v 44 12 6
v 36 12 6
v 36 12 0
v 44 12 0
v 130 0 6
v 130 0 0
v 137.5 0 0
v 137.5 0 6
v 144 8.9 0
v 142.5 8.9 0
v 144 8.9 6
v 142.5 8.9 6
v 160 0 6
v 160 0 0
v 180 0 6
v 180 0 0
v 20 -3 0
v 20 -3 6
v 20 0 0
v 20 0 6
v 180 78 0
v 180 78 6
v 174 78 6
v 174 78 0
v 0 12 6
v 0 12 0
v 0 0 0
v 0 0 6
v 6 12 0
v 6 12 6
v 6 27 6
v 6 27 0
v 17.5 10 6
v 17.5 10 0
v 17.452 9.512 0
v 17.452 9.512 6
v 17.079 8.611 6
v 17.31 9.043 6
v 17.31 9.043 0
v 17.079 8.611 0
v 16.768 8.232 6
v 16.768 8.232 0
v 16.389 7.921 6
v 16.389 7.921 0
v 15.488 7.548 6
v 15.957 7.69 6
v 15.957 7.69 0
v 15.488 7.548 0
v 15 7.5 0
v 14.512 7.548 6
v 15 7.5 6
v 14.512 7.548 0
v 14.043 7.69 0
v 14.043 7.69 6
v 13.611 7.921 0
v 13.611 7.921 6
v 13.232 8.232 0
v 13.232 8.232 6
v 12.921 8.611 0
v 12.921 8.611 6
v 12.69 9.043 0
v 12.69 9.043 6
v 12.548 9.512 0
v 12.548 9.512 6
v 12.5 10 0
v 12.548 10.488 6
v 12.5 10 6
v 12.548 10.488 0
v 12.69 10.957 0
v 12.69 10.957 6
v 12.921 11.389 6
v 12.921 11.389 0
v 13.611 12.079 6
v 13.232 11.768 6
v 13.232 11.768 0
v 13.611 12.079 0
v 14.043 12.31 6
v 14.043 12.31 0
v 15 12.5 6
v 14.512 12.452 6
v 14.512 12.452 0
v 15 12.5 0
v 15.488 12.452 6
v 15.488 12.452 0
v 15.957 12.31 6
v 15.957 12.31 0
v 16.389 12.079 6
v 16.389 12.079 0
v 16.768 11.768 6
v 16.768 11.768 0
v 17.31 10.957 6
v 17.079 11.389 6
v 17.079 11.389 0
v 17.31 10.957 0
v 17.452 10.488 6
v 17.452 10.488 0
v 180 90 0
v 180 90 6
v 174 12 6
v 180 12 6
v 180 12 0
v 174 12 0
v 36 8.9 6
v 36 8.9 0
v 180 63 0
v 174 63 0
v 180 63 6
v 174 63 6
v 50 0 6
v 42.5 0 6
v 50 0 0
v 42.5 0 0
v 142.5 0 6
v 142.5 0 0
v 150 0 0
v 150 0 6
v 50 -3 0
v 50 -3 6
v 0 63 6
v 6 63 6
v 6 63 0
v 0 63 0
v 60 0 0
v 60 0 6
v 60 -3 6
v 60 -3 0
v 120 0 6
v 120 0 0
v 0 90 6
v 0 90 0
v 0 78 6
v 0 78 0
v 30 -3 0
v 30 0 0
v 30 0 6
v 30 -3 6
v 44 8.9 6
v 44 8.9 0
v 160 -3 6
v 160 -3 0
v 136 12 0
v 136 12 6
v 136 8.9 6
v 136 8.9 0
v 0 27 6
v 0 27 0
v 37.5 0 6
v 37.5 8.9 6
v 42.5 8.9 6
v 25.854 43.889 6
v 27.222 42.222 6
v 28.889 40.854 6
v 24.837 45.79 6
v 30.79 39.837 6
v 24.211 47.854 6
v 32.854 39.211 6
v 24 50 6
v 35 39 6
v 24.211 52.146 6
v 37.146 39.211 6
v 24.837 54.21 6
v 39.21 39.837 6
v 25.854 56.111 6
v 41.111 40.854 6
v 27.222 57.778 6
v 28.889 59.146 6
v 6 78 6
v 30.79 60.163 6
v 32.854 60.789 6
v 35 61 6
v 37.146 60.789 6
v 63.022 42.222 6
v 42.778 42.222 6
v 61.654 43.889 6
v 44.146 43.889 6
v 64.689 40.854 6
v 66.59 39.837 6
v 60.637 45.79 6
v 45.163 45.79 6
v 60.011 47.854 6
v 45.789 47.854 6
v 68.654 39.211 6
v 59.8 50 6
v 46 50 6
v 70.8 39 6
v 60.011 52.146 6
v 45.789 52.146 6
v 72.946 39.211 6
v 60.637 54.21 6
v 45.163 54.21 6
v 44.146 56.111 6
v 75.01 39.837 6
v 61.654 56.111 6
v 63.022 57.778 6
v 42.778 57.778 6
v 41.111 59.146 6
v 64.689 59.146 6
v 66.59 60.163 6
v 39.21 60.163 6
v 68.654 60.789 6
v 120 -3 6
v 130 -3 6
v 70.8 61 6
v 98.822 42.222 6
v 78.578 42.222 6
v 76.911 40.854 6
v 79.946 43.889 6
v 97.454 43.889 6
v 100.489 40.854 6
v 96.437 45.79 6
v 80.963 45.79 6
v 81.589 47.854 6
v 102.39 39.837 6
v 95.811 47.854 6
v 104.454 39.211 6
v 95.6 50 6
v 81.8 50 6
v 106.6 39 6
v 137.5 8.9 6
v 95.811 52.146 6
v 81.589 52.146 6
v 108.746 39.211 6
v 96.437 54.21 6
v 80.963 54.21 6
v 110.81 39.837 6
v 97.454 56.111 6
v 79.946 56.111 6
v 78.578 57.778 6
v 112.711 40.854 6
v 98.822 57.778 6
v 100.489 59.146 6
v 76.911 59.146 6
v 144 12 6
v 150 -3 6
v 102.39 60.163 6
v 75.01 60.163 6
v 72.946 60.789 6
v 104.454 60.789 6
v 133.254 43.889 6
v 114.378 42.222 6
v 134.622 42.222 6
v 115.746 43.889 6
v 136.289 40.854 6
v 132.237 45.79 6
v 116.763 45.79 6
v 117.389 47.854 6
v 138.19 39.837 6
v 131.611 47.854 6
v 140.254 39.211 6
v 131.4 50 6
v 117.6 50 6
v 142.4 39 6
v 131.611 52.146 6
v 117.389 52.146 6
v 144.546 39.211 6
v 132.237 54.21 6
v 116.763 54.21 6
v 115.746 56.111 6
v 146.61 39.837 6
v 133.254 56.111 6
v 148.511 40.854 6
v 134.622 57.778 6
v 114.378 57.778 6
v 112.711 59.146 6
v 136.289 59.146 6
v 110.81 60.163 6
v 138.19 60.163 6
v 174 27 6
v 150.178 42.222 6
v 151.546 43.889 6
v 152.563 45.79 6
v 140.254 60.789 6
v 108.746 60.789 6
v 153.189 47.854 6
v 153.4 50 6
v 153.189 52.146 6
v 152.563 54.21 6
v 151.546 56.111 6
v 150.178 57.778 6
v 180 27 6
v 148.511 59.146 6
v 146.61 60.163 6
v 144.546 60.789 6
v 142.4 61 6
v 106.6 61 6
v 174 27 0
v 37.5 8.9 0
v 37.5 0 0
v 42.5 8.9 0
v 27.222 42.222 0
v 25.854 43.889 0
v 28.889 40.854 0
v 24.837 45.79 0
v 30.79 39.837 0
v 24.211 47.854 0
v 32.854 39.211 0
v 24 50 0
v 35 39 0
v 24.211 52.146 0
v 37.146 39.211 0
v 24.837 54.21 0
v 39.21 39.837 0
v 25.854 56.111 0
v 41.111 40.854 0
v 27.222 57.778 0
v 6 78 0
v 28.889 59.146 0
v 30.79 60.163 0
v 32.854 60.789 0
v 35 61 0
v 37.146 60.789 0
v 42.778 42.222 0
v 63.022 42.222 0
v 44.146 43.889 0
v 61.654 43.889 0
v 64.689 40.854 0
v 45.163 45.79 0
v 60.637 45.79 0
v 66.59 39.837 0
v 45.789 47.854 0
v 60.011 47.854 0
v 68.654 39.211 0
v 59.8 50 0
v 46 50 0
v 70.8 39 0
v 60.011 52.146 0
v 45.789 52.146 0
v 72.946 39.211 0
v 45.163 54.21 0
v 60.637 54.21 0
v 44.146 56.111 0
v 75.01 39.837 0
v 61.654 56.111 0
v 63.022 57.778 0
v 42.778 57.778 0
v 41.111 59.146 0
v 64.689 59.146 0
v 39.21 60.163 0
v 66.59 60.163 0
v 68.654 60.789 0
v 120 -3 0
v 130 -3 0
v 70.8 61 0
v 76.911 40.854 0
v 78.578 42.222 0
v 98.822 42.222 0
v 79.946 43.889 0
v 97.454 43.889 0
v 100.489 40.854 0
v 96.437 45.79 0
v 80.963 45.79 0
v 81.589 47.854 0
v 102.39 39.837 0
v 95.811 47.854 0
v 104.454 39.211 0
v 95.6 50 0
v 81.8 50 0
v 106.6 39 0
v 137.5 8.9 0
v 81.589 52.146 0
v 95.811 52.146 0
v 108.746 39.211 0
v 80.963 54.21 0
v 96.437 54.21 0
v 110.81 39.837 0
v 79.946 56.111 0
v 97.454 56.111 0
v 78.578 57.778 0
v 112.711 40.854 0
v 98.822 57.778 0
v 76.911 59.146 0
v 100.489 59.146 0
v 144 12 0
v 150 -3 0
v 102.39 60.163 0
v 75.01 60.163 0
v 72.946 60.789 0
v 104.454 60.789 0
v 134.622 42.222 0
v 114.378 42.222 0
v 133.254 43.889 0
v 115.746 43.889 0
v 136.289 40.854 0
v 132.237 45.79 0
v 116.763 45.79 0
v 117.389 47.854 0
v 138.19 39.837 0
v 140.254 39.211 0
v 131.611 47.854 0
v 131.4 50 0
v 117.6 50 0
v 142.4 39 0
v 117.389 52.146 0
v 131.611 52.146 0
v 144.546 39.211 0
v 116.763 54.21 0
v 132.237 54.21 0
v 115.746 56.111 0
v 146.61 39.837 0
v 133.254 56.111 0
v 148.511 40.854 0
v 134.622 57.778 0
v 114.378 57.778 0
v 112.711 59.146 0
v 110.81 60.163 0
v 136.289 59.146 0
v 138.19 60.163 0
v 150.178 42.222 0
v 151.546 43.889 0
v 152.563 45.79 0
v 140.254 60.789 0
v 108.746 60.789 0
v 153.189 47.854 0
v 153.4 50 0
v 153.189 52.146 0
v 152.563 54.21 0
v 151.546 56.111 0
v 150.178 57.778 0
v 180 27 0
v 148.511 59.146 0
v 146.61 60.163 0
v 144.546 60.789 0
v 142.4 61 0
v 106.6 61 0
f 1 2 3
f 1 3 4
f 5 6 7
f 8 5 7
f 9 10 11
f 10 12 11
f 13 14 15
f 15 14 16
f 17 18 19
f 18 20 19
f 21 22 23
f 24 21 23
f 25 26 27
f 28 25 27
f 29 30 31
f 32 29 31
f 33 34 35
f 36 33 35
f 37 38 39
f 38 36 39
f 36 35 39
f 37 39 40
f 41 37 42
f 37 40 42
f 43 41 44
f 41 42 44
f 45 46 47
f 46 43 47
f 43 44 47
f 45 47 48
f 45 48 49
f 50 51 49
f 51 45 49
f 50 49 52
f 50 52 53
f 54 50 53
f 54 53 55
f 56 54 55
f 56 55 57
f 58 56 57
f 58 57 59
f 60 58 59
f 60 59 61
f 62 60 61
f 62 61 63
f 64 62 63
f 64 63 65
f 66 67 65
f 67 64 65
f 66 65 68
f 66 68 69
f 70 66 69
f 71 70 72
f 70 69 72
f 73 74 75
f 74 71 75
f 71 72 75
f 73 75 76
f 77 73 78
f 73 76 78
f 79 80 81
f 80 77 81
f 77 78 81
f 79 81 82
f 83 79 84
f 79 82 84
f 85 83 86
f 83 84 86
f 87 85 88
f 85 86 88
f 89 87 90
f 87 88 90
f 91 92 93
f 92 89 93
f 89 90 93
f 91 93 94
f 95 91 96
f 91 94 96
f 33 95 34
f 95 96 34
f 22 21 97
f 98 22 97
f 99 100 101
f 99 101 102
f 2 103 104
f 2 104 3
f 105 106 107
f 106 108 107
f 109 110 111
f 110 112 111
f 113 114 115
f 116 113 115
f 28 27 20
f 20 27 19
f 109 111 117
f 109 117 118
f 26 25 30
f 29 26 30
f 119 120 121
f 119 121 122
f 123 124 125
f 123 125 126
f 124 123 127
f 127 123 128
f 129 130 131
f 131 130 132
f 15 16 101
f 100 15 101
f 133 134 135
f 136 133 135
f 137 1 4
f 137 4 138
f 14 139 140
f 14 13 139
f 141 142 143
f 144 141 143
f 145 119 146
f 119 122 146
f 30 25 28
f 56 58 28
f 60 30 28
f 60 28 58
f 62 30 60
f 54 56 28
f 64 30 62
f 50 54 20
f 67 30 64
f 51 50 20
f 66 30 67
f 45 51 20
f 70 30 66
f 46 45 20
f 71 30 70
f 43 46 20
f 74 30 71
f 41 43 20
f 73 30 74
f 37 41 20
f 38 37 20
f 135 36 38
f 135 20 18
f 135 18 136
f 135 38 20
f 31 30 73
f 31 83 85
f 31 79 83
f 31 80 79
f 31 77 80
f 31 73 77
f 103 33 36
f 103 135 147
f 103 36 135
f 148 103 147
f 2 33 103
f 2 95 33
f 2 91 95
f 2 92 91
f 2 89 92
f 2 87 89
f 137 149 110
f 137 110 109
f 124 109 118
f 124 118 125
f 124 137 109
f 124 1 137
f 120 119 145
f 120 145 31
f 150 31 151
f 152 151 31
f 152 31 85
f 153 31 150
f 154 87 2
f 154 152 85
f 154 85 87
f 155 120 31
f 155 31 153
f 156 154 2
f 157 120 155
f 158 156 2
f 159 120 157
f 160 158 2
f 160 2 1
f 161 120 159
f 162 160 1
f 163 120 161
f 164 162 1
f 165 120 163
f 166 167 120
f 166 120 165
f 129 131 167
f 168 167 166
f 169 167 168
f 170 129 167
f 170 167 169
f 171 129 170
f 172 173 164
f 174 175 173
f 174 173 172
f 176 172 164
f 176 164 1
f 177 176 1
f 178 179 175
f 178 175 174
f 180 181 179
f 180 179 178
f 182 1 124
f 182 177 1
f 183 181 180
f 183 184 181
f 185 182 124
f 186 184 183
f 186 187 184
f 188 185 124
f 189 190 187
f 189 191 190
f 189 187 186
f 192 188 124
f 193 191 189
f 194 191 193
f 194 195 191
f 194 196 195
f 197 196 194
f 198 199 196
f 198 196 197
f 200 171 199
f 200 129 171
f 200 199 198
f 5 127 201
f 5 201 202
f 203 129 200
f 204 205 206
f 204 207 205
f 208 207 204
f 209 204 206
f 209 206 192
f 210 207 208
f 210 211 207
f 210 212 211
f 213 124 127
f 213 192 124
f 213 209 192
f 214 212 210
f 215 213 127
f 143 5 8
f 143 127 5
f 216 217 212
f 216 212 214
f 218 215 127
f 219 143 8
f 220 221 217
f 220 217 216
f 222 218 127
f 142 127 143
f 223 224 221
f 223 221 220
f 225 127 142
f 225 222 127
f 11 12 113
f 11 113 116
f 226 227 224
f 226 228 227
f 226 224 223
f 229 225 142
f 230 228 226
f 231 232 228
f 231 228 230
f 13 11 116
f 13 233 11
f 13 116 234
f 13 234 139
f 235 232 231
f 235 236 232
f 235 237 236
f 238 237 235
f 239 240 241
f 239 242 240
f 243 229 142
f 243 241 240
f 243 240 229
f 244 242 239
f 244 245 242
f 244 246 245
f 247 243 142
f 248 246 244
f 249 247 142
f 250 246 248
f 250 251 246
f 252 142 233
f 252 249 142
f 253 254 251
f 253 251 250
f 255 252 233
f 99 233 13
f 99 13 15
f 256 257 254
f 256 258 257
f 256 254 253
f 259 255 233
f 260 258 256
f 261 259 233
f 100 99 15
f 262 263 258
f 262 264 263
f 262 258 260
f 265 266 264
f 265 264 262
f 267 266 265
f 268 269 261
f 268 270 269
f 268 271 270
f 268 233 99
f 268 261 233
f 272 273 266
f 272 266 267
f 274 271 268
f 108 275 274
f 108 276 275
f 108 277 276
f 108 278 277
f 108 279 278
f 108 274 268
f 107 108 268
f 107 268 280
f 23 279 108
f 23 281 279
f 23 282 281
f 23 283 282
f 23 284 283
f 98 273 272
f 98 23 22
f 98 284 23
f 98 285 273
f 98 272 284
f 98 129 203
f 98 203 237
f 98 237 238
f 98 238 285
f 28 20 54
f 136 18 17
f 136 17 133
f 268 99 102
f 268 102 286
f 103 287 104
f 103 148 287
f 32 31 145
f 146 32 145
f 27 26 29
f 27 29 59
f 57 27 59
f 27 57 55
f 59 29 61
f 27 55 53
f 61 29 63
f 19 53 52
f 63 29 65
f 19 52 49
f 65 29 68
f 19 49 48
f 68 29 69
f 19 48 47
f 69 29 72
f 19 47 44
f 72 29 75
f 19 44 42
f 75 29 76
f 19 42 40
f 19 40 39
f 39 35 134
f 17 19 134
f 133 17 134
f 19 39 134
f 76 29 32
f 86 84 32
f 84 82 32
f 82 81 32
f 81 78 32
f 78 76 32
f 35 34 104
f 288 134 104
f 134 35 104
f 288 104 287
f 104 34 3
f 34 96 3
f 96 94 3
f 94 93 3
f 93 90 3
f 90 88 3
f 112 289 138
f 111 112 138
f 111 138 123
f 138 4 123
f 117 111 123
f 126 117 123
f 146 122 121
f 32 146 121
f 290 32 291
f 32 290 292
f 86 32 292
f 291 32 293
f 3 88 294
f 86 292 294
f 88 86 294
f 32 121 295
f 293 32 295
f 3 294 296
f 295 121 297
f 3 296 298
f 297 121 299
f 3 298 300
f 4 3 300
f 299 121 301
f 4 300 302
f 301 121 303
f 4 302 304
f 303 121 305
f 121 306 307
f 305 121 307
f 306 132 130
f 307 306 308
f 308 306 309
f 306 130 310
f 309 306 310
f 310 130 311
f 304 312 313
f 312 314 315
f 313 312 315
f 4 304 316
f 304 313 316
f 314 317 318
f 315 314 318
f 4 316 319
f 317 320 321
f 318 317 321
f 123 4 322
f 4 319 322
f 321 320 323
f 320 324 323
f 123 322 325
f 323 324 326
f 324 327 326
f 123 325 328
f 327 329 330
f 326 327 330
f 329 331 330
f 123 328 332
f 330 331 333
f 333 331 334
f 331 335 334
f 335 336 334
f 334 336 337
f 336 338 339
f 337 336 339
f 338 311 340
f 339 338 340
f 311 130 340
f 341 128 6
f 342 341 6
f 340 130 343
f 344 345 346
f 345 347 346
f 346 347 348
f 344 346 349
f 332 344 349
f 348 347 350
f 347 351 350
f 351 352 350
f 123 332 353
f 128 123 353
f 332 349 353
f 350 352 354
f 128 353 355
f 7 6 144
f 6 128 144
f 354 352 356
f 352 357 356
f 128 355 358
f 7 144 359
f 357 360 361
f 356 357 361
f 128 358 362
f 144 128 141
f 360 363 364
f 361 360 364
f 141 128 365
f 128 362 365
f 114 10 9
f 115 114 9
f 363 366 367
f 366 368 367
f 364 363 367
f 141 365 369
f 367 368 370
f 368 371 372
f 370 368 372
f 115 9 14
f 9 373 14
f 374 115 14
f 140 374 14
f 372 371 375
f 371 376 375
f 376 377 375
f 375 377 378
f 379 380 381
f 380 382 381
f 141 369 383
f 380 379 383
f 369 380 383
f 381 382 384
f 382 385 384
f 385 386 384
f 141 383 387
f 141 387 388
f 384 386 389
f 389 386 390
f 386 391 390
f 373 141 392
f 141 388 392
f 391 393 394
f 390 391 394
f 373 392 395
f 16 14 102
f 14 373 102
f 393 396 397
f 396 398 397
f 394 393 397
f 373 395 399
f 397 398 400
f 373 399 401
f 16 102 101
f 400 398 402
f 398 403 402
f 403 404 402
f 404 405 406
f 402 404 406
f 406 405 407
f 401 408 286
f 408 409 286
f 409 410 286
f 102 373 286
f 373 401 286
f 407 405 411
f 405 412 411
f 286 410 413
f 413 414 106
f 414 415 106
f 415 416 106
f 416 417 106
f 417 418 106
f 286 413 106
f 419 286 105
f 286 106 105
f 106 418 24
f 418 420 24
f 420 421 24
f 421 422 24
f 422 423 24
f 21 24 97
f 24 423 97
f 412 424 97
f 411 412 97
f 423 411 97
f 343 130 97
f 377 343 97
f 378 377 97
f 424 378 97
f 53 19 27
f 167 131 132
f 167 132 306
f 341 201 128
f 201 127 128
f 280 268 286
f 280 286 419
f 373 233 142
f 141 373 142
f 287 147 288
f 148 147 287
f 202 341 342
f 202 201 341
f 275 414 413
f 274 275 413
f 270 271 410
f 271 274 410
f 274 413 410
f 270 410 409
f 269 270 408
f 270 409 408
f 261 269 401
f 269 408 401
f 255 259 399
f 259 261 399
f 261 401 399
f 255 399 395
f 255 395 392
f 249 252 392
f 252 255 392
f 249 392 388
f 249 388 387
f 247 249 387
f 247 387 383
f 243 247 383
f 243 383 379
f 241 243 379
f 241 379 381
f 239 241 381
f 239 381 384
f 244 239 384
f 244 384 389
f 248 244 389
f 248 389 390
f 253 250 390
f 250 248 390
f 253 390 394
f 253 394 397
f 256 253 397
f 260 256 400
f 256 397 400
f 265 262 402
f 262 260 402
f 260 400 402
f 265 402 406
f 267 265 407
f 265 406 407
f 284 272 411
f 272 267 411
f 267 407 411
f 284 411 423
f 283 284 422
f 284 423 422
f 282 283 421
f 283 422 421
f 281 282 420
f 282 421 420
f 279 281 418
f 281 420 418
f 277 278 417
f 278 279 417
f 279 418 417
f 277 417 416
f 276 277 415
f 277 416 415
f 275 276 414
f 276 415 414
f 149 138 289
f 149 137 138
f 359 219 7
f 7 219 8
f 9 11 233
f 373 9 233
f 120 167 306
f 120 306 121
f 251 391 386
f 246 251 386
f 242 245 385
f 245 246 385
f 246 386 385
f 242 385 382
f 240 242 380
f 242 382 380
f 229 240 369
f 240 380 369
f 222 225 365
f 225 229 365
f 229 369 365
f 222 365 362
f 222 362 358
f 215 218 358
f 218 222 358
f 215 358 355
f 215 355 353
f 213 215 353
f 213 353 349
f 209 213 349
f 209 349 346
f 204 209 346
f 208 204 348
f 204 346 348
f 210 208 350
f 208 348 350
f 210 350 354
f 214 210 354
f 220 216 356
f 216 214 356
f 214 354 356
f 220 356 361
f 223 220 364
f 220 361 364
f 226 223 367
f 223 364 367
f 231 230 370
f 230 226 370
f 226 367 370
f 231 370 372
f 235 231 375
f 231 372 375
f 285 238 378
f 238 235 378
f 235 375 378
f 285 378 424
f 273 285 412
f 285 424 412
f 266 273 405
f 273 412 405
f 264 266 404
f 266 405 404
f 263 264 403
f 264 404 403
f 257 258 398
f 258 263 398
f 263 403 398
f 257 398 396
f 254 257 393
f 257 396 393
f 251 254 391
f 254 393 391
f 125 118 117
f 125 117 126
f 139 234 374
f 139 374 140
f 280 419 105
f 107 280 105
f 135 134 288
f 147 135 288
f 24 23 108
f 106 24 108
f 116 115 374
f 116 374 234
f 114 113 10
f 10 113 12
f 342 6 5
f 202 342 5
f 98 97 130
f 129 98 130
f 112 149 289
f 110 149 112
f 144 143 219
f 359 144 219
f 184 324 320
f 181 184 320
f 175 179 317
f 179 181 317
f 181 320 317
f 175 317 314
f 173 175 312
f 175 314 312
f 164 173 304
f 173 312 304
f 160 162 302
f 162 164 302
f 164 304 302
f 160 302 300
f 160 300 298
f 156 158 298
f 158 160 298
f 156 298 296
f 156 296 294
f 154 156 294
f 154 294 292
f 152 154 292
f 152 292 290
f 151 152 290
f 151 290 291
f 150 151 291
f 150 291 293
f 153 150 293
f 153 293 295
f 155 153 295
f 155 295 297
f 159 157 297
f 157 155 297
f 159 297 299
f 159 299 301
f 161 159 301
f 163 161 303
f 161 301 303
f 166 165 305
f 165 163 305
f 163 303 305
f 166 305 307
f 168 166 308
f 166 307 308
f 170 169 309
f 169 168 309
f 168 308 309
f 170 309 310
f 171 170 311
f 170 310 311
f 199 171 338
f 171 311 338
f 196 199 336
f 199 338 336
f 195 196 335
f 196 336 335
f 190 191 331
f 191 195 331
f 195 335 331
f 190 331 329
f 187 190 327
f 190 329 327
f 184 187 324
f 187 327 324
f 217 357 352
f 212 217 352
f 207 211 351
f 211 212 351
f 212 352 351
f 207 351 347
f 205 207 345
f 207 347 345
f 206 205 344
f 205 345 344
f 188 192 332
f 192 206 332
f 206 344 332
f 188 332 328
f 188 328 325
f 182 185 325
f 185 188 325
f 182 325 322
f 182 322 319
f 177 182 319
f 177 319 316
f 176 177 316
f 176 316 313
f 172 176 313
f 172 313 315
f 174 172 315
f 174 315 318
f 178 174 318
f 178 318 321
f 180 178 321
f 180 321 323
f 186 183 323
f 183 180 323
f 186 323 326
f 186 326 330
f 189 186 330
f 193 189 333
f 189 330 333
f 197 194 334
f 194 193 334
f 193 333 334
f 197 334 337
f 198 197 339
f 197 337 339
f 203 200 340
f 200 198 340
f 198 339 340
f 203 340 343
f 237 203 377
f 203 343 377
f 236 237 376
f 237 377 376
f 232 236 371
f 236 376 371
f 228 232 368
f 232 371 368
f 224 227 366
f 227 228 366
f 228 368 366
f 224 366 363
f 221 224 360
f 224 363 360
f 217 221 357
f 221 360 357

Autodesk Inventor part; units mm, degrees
ref_plane "YZ Plane" through (0, 0, 0) normal (1, 0, 0) x (0, 1, 0)
ref_plane "XZ Plane" through (0, 0, 0) normal (0, 1, 0) x (-1, 0, 0)
ref_plane "XY Plane" through (0, 0, 0) normal (0, 0, 1) x (1, 0, 0)
sketch "Boceto3" plane through (0, 0, 0) normal (0, 0, 1) x (1, 0, 0)
  line L0 (0, 0) -> (180, 0)
  line L1 (180, 0) -> (180, 90)
  line L2 (180, 90) -> (0, 90)
  line L3 (0, 90) -> (0, 0)
  circle A0 centre (35, 50) radius 11
  circle A1 centre (70.8, 50) radius 11
  circle A2 centre (106.6, 50) radius 11
  circle A3 centre (142.4, 50) radius 11
  circle A4 centre (15, 10) radius 2.5
  dimension "d1" = 90
  dimension "d3" = 22
  dimension "d4" = 50
  dimension "d6" = 35.8
  dimension "d7" = 35.8
  dimension "d8" = 35.8
  dimension "d9" = 35
  dimension "d37" = 5
  dimension "d38" = 10
  dimension "d39" = 15
  dimension "d40" = 180
extrude "Extrusión1" add sketch "Boceto3" along normal blind 6
sketch "Boceto4" plane through (0, 0, 6) normal (0, 0, 1) x (1, 0, 0)
  line L0 (36, 12) -> (44, 12)
  line L1 (44, 12) -> (44, 8.9)
  line L2 (36, 8.9) -> (36, 12)
  line L3 (0, 0) -> (180, 0) projected
  line L4 (42.5, 8.9) -> (42.5, 0)
  line L5 (37.5, 0) -> (37.5, 8.9)
  line L6 (44, 8.9) -> (42.5, 8.9)
  line L7 (37.5, 8.9) -> (36, 8.9)
  line L8 (37.5, 0) -> (42.5, 0)
  line L9 (180, 90) -> (0, 90) projected
  line L10 (90, 90) -> (90, 0)
  line L11 (144, 12) -> (136, 12)
  line L12 (136, 12) -> (136, 8.9)
  line L13 (144, 8.9) -> (144, 12)
  line L14 (137.5, 8.9) -> (137.5, 0)
  line L15 (142.5, 0) -> (142.5, 8.9)
  line L16 (136, 8.9) -> (137.5, 8.9)
  line L17 (142.5, 8.9) -> (144, 8.9)
  line L18 (142.5, 0) -> (137.5, 0)
  point P0 (40, 12)
  point P1 (40, 0)
  point P2 (140, 12)
  point P3 (140, 0)
  point P4 (137.5, 0)
  point P5 (142.5, 0)
  dimension "d12" = 8
  dimension "d13" = 3.1
  dimension "d14" = 5
  dimension "d15" = 12
  dimension "d16" = 40
sketch "Boceto5" plane through (0, 0, 0) normal (0, -1, 0) x (1, 0, 0)
  line L0 (180, 6) -> (0, 6) projected
  line L1 (180, 0) -> (0, 0) projected
  line L2 (30, 6) -> (20, 6)
  line L3 (20, 6) -> (20, 0)
  line L4 (20, 0) -> (30, 0)
  line L5 (30, 0) -> (30, 6)
  line L6 (50, 6) -> (60, 6)
  line L7 (60, 6) -> (60, 0)
  line L8 (60, 0) -> (50, 0)
  line L9 (50, 0) -> (50, 6)
  line L10 (90, 6) -> (90, 0)
  line L11 (150, 6) -> (160, 6)
  line L12 (160, 6) -> (160, 0)
  line L13 (160, 0) -> (150, 0)
  line L14 (150, 0) -> (150, 6)
  line L15 (130, 6) -> (120, 6)
  line L16 (120, 6) -> (120, 0)
  line L17 (120, 0) -> (130, 0)
  line L18 (130, 0) -> (130, 6)
  point P0 (150, 6)
  point P1 (150, 0)
  point P2 (160, 0)
  point P3 (160, 6)
  point P4 (130, 0)
  point P5 (130, 6)
  point P6 (120, 6)
  point P7 (120, 0)
  point P8 (50, 0)
  point P9 (30, 0)
  point P10 (20, 6)
  dimension "d17" = 10
  dimension "d18" = 10
  dimension "d19" = 20
  dimension "d20" = 20
extrude "Extrusión2" cut sketch "Boceto4" against normal through all
extrude "Extrusión3" add sketch "Boceto5" along normal blind 3 contours L12 L1 L14 L0 | L18 L1 L16 L0 | L7 L1 L9 L0 | L5 L1 L3 L0
sketch "Boceto7" plane through (0, 0, 6) normal (0, 0, 1) x (1, 0, 0)
  line L0 (0, 78) -> (6, 78)
  line L1 (6, 78) -> (6, 63)
  line L2 (6, 63) -> (0, 63)
  line L3 (180, 90) -> (0, 90) projected
  line L4 (0, 90) -> (0, 0) projected
  line L5 (180, 0) -> (180, 90) projected
  line L6 (0, 45) -> (180, 45)
  line L7 (90, 90) -> (90, 0)
  line L8 (60, 0) -> (120, 0) projected
  line L9 (0, 12) -> (6, 12)
  line L10 (6, 12) -> (6, 27)
  line L11 (6, 27) -> (0, 27)
  line L12 (180, 78) -> (174, 78)
  line L13 (174, 78) -> (174, 63)
  line L14 (174, 63) -> (180, 63)
  line L15 (180, 12) -> (174, 12)
  line L16 (174, 12) -> (174, 27)
  line L17 (174, 27) -> (180, 27)
  point P0 (0, 27)
  point P1 (180, 12)
  point P2 (180, 27)
  point P3 (180, 63)
  point P4 (180, 78)
  dimension "d31" = 6
  dimension "d32" = 15
  dimension "d33" = 12
extrude "Extrusión5" cut sketch "Boceto7" against normal through all contours L5 L15 L16 L17 | L11 L10 L9 L4 | L0 L1 L2 L4 | L5 L14 L13 L12
properties part number "CaraLateral"
